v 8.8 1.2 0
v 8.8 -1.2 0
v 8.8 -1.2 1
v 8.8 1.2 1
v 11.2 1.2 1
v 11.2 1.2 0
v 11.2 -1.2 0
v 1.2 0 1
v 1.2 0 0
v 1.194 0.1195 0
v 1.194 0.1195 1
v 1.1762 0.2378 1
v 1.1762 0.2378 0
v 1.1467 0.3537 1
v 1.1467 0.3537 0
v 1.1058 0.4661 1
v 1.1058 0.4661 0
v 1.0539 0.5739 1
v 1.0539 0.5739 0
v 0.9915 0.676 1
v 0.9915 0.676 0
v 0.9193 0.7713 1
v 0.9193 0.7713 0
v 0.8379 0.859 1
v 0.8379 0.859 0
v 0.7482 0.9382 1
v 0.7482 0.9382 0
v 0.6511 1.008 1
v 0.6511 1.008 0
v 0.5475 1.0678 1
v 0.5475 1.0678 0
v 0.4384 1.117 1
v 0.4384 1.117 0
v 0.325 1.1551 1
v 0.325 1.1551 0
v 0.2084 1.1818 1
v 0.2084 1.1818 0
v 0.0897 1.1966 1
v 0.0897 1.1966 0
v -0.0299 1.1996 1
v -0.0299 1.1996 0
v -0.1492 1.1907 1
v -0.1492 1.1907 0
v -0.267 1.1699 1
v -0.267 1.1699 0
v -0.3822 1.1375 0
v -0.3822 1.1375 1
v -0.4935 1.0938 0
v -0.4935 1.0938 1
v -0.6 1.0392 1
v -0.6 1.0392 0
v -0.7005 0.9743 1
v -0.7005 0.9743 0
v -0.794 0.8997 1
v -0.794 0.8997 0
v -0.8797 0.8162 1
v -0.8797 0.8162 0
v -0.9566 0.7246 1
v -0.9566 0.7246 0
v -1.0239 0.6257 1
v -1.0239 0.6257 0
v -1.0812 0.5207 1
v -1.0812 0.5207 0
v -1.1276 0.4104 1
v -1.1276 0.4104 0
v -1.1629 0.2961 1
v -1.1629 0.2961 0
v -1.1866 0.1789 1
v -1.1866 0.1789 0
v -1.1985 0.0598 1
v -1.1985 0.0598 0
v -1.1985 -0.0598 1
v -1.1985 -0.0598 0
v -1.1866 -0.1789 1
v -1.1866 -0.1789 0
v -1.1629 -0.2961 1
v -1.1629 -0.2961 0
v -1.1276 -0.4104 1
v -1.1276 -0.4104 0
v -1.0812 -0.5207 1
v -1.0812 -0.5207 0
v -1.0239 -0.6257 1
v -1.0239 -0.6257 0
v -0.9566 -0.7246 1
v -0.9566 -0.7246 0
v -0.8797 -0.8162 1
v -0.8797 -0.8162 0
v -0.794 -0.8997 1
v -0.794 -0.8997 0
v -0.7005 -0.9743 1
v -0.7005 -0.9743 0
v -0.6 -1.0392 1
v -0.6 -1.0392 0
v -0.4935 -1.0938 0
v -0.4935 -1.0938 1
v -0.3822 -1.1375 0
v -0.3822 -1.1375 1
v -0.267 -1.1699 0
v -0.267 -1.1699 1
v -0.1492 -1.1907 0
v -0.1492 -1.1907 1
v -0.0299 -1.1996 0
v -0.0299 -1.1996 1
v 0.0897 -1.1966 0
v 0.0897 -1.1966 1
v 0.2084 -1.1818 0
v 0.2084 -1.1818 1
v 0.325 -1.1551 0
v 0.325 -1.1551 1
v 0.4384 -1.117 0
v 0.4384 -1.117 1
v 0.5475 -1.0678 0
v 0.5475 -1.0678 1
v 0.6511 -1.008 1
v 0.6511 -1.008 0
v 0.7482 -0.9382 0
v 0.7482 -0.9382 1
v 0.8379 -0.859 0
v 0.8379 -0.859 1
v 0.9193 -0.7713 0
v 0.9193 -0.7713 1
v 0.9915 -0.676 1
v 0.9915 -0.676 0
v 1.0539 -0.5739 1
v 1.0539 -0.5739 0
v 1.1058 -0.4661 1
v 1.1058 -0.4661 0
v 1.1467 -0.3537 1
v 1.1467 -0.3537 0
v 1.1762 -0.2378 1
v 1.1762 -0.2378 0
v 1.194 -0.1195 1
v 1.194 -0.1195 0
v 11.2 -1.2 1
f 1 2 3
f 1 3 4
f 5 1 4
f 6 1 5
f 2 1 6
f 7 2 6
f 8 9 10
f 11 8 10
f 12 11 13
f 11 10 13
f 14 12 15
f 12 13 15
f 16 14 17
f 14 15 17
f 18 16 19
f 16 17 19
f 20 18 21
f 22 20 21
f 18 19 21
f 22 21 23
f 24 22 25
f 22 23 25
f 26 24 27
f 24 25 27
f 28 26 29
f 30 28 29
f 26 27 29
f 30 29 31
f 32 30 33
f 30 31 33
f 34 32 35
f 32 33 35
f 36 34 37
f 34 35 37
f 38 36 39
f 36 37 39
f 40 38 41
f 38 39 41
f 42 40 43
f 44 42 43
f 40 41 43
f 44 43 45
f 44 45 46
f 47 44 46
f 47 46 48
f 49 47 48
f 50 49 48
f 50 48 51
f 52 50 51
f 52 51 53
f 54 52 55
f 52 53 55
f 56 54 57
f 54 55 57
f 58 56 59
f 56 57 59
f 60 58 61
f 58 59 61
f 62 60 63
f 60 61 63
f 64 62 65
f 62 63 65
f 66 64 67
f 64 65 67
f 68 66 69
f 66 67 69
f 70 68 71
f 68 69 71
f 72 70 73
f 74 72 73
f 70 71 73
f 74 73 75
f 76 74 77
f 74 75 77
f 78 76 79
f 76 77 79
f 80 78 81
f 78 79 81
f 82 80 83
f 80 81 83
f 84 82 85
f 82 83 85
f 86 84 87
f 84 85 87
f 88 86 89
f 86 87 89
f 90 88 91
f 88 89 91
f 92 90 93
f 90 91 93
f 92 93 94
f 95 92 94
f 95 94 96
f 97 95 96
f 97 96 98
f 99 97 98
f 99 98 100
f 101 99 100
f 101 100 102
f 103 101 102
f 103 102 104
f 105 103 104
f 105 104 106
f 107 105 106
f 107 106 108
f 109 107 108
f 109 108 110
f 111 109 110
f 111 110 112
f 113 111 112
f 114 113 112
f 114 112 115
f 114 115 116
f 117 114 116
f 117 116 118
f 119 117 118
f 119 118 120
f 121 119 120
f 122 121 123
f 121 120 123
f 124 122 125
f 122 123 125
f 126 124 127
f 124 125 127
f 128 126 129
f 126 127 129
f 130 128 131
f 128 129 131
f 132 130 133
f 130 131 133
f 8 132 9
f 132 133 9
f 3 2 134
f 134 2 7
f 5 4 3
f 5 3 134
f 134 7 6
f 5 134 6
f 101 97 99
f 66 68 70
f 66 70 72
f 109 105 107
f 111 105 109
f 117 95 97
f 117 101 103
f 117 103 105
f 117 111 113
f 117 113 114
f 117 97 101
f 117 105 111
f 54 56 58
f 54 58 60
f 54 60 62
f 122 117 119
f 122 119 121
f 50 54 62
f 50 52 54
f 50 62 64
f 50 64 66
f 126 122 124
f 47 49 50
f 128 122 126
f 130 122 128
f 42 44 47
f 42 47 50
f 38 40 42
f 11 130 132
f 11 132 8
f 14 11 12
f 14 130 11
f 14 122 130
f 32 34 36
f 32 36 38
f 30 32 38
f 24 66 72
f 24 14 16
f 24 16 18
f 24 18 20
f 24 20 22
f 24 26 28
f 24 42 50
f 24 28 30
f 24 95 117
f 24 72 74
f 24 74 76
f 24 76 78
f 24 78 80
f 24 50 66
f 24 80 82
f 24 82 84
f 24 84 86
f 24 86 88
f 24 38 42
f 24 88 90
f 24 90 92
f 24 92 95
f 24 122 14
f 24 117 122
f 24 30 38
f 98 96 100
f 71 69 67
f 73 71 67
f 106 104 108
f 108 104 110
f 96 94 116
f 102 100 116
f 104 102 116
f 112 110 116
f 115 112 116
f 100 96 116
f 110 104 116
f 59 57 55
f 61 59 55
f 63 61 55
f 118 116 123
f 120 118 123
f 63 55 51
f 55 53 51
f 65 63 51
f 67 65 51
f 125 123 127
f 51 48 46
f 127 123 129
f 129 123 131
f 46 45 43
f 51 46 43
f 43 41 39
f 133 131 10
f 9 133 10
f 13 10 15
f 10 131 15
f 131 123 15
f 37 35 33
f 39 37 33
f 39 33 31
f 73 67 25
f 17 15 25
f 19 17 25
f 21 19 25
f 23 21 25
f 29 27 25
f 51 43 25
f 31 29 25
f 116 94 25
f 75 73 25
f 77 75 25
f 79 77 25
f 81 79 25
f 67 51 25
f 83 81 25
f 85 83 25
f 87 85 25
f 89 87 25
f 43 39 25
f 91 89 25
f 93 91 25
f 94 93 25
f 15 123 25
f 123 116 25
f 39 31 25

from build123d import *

# Parameters (mm, degrees)
F0_R     = 1.2
F0_W     = 2.4
F0_H     = 2.4
F1_DEPTH = 1


with BuildPart() as f1:
    # F0 (on Top) → F1 (new body)
    with BuildSketch(Plane.XY):
        Circle(F0_R)
        with Locations((10, 0)):
            Rectangle(F0_W, F0_H)
    extrude(amount=F1_DEPTH)


solid = f1.part
